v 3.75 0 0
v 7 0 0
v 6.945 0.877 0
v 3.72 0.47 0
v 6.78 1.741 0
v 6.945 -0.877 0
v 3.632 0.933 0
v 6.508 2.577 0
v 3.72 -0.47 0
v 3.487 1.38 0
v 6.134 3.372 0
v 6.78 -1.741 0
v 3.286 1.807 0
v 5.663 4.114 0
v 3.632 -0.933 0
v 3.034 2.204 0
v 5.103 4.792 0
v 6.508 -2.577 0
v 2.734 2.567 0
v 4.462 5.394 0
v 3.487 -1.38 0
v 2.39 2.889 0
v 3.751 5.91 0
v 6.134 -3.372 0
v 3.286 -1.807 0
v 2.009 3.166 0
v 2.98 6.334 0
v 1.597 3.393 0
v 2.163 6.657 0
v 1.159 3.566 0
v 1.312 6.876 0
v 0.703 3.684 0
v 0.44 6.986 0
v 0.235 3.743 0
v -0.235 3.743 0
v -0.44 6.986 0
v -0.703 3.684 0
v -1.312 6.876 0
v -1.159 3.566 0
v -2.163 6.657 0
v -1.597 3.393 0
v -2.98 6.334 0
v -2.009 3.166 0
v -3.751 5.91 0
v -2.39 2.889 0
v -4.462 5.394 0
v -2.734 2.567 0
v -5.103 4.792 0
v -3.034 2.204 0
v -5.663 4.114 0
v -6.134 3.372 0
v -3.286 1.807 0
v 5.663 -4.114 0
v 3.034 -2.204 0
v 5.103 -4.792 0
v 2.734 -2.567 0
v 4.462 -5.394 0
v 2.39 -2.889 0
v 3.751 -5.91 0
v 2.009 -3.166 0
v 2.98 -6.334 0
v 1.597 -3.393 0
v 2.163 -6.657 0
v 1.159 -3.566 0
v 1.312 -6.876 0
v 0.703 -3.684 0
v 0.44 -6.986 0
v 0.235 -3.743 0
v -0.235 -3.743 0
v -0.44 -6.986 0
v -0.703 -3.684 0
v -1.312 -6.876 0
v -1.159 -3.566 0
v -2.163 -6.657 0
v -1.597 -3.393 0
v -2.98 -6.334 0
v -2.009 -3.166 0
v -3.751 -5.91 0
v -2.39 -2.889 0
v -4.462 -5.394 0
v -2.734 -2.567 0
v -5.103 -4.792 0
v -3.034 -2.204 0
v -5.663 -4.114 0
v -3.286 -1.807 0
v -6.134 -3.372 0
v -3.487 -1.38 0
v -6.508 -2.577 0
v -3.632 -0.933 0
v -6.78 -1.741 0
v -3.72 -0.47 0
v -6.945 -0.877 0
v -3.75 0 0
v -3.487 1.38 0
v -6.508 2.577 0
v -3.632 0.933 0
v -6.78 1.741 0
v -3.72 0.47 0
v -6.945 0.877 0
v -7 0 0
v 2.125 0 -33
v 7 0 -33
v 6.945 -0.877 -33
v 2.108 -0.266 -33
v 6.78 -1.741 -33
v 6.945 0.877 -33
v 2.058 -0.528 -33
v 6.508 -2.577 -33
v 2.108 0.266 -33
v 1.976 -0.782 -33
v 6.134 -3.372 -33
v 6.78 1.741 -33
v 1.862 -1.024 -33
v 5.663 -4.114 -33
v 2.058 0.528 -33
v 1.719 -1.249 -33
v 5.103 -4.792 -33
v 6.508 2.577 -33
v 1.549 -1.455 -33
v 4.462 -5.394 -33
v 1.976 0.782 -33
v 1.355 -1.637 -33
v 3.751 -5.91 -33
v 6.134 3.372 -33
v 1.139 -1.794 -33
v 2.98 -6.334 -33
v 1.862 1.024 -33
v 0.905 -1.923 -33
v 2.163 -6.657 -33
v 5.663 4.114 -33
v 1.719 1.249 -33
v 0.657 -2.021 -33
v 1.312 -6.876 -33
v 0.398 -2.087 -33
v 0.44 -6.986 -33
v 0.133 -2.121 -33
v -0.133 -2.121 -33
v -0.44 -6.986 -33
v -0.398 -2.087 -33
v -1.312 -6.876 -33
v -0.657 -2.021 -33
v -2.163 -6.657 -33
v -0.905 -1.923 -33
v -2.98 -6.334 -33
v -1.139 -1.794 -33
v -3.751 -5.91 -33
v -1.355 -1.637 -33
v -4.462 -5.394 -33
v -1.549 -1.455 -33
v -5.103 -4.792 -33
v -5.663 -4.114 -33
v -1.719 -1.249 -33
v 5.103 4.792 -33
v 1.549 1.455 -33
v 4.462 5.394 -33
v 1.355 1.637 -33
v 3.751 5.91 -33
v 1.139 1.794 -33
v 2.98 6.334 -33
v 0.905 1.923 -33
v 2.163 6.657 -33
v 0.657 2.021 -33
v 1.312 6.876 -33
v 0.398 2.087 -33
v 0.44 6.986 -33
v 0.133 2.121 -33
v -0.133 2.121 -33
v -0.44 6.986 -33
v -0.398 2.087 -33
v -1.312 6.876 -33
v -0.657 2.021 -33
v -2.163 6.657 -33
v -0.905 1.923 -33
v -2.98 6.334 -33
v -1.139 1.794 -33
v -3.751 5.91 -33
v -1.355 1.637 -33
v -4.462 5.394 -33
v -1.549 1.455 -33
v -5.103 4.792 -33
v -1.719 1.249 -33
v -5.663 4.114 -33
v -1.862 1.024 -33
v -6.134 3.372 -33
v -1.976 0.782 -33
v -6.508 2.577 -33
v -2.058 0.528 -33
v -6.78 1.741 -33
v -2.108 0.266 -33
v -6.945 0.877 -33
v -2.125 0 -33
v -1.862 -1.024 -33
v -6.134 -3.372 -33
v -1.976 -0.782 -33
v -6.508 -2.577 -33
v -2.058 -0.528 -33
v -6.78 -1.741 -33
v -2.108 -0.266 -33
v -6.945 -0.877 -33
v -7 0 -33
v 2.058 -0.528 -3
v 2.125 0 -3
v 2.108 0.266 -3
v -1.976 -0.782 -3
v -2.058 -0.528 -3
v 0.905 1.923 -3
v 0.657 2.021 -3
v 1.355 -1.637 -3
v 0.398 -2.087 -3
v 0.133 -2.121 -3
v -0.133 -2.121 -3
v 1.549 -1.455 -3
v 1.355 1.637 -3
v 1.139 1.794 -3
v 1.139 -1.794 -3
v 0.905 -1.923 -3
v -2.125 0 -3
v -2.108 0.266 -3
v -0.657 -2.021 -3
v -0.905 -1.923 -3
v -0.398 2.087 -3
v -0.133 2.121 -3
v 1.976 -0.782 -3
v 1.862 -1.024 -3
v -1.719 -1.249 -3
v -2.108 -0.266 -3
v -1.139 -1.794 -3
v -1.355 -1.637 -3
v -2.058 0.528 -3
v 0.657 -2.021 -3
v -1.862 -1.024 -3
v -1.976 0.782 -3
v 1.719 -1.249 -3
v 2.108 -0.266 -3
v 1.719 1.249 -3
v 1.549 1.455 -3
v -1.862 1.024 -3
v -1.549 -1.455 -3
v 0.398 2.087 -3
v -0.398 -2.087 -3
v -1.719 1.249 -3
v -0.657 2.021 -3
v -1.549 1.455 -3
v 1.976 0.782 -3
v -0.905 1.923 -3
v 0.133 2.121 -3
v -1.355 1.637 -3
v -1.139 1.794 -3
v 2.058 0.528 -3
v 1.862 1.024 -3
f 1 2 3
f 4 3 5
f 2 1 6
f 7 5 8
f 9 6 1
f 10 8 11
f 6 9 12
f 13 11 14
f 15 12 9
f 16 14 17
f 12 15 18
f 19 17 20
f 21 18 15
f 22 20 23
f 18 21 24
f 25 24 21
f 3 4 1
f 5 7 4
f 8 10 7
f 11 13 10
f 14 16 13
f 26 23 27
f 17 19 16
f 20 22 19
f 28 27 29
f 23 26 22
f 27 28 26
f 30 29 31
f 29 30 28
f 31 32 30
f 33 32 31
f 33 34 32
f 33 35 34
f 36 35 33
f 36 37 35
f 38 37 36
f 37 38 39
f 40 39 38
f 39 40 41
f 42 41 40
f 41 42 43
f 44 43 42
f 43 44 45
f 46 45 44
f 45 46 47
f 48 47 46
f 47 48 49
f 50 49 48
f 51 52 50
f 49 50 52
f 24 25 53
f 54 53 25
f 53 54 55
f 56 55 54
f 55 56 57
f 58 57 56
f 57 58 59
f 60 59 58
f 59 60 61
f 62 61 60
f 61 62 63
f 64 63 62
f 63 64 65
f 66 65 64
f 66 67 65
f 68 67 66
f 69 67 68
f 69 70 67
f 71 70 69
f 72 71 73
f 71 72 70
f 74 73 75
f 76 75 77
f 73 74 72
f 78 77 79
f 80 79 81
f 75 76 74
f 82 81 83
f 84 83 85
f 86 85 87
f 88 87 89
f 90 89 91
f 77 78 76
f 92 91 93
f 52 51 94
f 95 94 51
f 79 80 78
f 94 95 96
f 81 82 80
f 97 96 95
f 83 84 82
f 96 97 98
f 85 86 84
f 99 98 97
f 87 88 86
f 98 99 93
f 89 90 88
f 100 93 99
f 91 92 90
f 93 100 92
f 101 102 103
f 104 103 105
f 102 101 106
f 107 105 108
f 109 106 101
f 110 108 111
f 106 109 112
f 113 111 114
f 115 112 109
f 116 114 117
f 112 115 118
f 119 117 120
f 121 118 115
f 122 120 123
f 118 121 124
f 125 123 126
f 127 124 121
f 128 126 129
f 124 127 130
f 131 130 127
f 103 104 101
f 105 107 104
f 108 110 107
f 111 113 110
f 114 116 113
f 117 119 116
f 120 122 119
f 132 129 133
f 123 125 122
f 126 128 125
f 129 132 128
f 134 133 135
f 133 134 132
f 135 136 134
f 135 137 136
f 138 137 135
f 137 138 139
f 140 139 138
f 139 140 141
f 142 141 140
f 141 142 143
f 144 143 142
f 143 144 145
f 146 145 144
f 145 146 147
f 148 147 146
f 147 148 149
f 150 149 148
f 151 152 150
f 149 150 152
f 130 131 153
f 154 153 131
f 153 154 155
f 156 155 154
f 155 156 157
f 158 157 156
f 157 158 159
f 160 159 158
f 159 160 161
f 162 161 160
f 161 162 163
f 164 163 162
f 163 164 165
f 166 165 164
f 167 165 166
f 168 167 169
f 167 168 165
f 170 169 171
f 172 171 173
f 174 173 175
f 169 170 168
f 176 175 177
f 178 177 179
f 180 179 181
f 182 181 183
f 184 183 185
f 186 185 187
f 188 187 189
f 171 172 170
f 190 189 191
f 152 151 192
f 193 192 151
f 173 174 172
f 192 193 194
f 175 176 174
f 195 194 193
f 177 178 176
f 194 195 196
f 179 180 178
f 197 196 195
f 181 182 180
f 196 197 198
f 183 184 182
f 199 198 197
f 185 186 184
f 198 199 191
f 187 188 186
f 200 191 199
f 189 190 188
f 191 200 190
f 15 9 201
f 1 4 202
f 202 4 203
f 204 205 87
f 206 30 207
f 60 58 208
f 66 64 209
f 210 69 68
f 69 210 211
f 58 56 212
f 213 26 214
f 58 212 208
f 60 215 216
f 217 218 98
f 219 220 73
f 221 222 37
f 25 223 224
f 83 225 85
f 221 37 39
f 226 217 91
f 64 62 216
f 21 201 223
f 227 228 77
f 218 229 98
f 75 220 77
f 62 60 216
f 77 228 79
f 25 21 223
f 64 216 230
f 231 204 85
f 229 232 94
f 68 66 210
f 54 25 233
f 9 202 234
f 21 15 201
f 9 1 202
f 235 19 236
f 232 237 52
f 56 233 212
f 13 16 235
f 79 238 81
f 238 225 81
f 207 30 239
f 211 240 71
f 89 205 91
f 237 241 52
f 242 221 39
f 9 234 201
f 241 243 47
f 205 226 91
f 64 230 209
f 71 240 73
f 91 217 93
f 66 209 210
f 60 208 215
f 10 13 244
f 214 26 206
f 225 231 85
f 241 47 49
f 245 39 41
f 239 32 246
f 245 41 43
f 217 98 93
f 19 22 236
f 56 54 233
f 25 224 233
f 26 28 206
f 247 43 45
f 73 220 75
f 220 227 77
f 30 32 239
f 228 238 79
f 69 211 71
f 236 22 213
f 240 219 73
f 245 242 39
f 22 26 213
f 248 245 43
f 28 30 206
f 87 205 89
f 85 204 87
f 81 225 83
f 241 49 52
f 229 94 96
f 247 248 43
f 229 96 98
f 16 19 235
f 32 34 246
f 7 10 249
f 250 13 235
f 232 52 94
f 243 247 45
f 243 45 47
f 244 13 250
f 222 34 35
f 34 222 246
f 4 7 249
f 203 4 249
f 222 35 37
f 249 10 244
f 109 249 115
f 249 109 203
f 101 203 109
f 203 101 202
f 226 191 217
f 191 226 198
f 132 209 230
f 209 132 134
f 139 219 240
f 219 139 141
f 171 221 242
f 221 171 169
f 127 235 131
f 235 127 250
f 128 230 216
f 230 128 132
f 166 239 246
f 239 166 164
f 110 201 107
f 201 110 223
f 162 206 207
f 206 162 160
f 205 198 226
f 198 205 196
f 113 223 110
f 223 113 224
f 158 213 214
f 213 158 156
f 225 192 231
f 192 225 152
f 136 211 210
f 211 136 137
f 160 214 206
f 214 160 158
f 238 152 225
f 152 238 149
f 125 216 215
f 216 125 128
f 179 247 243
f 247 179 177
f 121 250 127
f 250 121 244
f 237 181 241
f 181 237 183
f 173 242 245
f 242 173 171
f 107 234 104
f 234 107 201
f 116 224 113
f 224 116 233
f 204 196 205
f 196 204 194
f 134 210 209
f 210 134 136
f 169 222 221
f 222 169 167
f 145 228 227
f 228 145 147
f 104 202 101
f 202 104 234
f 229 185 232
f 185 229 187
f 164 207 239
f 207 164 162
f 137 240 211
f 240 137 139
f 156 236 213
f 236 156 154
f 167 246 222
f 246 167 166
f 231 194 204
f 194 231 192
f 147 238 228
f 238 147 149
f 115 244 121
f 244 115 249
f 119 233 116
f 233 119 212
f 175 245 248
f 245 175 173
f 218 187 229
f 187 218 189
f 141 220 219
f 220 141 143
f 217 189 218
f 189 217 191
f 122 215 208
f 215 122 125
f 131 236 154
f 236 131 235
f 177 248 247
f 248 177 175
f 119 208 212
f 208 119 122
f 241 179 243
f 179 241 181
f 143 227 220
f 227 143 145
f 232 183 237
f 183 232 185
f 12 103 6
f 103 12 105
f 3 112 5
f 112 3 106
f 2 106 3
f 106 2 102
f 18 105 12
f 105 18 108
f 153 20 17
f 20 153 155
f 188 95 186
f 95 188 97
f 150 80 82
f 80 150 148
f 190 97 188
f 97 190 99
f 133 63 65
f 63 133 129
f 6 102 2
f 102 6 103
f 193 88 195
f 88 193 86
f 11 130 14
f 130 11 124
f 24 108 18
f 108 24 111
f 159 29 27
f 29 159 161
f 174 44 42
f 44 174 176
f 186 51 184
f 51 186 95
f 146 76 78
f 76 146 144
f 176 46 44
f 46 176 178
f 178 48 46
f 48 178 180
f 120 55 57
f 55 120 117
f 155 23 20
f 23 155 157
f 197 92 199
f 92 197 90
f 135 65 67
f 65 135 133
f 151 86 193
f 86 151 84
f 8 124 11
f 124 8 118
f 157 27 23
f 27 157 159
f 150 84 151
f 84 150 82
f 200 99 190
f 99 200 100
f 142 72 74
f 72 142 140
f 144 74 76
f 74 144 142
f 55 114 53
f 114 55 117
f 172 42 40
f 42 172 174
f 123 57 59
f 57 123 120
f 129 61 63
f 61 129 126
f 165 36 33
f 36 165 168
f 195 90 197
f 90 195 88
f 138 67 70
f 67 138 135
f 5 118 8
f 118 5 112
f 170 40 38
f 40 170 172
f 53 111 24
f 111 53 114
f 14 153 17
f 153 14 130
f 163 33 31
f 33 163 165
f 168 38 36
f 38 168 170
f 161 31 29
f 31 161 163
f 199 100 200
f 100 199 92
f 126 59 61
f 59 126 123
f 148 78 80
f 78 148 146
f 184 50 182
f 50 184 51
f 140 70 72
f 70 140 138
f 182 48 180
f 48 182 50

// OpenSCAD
$fn = 50;


difference() {
	union() {
		translate(v = [0, 0, -33.0000000000]) {
			cylinder(h = 33, r = 7.0000000000);
		}
		cylinder(h = 0, r = 10.0000000000);
	}
	union() {
		translate(v = [0, 0, 0]) {
			rotate(a = [0, 0, 0]) {
				difference() {
					union() {
						#translate(v = [0, 0, -33.0000000000]) {
							cylinder(h = 33, r = 2.0000000000);
						}
						#translate(v = [0, 0, -3]) {
							cylinder(h = 3, r = 7.0000000000, r1 = 2.1250000000, r2 = 3.7500000000);
						}
						#translate(v = [0, 0, -33.0000000000]) {
							cylinder(h = 33, r = 2.1250000000);
						}
						#translate(v = [0, 0, -33.0000000000]) {
							cylinder(h = 33, r = 2.0000000000);
						}
					}
					union();
				}
			}
		}
	}
}
